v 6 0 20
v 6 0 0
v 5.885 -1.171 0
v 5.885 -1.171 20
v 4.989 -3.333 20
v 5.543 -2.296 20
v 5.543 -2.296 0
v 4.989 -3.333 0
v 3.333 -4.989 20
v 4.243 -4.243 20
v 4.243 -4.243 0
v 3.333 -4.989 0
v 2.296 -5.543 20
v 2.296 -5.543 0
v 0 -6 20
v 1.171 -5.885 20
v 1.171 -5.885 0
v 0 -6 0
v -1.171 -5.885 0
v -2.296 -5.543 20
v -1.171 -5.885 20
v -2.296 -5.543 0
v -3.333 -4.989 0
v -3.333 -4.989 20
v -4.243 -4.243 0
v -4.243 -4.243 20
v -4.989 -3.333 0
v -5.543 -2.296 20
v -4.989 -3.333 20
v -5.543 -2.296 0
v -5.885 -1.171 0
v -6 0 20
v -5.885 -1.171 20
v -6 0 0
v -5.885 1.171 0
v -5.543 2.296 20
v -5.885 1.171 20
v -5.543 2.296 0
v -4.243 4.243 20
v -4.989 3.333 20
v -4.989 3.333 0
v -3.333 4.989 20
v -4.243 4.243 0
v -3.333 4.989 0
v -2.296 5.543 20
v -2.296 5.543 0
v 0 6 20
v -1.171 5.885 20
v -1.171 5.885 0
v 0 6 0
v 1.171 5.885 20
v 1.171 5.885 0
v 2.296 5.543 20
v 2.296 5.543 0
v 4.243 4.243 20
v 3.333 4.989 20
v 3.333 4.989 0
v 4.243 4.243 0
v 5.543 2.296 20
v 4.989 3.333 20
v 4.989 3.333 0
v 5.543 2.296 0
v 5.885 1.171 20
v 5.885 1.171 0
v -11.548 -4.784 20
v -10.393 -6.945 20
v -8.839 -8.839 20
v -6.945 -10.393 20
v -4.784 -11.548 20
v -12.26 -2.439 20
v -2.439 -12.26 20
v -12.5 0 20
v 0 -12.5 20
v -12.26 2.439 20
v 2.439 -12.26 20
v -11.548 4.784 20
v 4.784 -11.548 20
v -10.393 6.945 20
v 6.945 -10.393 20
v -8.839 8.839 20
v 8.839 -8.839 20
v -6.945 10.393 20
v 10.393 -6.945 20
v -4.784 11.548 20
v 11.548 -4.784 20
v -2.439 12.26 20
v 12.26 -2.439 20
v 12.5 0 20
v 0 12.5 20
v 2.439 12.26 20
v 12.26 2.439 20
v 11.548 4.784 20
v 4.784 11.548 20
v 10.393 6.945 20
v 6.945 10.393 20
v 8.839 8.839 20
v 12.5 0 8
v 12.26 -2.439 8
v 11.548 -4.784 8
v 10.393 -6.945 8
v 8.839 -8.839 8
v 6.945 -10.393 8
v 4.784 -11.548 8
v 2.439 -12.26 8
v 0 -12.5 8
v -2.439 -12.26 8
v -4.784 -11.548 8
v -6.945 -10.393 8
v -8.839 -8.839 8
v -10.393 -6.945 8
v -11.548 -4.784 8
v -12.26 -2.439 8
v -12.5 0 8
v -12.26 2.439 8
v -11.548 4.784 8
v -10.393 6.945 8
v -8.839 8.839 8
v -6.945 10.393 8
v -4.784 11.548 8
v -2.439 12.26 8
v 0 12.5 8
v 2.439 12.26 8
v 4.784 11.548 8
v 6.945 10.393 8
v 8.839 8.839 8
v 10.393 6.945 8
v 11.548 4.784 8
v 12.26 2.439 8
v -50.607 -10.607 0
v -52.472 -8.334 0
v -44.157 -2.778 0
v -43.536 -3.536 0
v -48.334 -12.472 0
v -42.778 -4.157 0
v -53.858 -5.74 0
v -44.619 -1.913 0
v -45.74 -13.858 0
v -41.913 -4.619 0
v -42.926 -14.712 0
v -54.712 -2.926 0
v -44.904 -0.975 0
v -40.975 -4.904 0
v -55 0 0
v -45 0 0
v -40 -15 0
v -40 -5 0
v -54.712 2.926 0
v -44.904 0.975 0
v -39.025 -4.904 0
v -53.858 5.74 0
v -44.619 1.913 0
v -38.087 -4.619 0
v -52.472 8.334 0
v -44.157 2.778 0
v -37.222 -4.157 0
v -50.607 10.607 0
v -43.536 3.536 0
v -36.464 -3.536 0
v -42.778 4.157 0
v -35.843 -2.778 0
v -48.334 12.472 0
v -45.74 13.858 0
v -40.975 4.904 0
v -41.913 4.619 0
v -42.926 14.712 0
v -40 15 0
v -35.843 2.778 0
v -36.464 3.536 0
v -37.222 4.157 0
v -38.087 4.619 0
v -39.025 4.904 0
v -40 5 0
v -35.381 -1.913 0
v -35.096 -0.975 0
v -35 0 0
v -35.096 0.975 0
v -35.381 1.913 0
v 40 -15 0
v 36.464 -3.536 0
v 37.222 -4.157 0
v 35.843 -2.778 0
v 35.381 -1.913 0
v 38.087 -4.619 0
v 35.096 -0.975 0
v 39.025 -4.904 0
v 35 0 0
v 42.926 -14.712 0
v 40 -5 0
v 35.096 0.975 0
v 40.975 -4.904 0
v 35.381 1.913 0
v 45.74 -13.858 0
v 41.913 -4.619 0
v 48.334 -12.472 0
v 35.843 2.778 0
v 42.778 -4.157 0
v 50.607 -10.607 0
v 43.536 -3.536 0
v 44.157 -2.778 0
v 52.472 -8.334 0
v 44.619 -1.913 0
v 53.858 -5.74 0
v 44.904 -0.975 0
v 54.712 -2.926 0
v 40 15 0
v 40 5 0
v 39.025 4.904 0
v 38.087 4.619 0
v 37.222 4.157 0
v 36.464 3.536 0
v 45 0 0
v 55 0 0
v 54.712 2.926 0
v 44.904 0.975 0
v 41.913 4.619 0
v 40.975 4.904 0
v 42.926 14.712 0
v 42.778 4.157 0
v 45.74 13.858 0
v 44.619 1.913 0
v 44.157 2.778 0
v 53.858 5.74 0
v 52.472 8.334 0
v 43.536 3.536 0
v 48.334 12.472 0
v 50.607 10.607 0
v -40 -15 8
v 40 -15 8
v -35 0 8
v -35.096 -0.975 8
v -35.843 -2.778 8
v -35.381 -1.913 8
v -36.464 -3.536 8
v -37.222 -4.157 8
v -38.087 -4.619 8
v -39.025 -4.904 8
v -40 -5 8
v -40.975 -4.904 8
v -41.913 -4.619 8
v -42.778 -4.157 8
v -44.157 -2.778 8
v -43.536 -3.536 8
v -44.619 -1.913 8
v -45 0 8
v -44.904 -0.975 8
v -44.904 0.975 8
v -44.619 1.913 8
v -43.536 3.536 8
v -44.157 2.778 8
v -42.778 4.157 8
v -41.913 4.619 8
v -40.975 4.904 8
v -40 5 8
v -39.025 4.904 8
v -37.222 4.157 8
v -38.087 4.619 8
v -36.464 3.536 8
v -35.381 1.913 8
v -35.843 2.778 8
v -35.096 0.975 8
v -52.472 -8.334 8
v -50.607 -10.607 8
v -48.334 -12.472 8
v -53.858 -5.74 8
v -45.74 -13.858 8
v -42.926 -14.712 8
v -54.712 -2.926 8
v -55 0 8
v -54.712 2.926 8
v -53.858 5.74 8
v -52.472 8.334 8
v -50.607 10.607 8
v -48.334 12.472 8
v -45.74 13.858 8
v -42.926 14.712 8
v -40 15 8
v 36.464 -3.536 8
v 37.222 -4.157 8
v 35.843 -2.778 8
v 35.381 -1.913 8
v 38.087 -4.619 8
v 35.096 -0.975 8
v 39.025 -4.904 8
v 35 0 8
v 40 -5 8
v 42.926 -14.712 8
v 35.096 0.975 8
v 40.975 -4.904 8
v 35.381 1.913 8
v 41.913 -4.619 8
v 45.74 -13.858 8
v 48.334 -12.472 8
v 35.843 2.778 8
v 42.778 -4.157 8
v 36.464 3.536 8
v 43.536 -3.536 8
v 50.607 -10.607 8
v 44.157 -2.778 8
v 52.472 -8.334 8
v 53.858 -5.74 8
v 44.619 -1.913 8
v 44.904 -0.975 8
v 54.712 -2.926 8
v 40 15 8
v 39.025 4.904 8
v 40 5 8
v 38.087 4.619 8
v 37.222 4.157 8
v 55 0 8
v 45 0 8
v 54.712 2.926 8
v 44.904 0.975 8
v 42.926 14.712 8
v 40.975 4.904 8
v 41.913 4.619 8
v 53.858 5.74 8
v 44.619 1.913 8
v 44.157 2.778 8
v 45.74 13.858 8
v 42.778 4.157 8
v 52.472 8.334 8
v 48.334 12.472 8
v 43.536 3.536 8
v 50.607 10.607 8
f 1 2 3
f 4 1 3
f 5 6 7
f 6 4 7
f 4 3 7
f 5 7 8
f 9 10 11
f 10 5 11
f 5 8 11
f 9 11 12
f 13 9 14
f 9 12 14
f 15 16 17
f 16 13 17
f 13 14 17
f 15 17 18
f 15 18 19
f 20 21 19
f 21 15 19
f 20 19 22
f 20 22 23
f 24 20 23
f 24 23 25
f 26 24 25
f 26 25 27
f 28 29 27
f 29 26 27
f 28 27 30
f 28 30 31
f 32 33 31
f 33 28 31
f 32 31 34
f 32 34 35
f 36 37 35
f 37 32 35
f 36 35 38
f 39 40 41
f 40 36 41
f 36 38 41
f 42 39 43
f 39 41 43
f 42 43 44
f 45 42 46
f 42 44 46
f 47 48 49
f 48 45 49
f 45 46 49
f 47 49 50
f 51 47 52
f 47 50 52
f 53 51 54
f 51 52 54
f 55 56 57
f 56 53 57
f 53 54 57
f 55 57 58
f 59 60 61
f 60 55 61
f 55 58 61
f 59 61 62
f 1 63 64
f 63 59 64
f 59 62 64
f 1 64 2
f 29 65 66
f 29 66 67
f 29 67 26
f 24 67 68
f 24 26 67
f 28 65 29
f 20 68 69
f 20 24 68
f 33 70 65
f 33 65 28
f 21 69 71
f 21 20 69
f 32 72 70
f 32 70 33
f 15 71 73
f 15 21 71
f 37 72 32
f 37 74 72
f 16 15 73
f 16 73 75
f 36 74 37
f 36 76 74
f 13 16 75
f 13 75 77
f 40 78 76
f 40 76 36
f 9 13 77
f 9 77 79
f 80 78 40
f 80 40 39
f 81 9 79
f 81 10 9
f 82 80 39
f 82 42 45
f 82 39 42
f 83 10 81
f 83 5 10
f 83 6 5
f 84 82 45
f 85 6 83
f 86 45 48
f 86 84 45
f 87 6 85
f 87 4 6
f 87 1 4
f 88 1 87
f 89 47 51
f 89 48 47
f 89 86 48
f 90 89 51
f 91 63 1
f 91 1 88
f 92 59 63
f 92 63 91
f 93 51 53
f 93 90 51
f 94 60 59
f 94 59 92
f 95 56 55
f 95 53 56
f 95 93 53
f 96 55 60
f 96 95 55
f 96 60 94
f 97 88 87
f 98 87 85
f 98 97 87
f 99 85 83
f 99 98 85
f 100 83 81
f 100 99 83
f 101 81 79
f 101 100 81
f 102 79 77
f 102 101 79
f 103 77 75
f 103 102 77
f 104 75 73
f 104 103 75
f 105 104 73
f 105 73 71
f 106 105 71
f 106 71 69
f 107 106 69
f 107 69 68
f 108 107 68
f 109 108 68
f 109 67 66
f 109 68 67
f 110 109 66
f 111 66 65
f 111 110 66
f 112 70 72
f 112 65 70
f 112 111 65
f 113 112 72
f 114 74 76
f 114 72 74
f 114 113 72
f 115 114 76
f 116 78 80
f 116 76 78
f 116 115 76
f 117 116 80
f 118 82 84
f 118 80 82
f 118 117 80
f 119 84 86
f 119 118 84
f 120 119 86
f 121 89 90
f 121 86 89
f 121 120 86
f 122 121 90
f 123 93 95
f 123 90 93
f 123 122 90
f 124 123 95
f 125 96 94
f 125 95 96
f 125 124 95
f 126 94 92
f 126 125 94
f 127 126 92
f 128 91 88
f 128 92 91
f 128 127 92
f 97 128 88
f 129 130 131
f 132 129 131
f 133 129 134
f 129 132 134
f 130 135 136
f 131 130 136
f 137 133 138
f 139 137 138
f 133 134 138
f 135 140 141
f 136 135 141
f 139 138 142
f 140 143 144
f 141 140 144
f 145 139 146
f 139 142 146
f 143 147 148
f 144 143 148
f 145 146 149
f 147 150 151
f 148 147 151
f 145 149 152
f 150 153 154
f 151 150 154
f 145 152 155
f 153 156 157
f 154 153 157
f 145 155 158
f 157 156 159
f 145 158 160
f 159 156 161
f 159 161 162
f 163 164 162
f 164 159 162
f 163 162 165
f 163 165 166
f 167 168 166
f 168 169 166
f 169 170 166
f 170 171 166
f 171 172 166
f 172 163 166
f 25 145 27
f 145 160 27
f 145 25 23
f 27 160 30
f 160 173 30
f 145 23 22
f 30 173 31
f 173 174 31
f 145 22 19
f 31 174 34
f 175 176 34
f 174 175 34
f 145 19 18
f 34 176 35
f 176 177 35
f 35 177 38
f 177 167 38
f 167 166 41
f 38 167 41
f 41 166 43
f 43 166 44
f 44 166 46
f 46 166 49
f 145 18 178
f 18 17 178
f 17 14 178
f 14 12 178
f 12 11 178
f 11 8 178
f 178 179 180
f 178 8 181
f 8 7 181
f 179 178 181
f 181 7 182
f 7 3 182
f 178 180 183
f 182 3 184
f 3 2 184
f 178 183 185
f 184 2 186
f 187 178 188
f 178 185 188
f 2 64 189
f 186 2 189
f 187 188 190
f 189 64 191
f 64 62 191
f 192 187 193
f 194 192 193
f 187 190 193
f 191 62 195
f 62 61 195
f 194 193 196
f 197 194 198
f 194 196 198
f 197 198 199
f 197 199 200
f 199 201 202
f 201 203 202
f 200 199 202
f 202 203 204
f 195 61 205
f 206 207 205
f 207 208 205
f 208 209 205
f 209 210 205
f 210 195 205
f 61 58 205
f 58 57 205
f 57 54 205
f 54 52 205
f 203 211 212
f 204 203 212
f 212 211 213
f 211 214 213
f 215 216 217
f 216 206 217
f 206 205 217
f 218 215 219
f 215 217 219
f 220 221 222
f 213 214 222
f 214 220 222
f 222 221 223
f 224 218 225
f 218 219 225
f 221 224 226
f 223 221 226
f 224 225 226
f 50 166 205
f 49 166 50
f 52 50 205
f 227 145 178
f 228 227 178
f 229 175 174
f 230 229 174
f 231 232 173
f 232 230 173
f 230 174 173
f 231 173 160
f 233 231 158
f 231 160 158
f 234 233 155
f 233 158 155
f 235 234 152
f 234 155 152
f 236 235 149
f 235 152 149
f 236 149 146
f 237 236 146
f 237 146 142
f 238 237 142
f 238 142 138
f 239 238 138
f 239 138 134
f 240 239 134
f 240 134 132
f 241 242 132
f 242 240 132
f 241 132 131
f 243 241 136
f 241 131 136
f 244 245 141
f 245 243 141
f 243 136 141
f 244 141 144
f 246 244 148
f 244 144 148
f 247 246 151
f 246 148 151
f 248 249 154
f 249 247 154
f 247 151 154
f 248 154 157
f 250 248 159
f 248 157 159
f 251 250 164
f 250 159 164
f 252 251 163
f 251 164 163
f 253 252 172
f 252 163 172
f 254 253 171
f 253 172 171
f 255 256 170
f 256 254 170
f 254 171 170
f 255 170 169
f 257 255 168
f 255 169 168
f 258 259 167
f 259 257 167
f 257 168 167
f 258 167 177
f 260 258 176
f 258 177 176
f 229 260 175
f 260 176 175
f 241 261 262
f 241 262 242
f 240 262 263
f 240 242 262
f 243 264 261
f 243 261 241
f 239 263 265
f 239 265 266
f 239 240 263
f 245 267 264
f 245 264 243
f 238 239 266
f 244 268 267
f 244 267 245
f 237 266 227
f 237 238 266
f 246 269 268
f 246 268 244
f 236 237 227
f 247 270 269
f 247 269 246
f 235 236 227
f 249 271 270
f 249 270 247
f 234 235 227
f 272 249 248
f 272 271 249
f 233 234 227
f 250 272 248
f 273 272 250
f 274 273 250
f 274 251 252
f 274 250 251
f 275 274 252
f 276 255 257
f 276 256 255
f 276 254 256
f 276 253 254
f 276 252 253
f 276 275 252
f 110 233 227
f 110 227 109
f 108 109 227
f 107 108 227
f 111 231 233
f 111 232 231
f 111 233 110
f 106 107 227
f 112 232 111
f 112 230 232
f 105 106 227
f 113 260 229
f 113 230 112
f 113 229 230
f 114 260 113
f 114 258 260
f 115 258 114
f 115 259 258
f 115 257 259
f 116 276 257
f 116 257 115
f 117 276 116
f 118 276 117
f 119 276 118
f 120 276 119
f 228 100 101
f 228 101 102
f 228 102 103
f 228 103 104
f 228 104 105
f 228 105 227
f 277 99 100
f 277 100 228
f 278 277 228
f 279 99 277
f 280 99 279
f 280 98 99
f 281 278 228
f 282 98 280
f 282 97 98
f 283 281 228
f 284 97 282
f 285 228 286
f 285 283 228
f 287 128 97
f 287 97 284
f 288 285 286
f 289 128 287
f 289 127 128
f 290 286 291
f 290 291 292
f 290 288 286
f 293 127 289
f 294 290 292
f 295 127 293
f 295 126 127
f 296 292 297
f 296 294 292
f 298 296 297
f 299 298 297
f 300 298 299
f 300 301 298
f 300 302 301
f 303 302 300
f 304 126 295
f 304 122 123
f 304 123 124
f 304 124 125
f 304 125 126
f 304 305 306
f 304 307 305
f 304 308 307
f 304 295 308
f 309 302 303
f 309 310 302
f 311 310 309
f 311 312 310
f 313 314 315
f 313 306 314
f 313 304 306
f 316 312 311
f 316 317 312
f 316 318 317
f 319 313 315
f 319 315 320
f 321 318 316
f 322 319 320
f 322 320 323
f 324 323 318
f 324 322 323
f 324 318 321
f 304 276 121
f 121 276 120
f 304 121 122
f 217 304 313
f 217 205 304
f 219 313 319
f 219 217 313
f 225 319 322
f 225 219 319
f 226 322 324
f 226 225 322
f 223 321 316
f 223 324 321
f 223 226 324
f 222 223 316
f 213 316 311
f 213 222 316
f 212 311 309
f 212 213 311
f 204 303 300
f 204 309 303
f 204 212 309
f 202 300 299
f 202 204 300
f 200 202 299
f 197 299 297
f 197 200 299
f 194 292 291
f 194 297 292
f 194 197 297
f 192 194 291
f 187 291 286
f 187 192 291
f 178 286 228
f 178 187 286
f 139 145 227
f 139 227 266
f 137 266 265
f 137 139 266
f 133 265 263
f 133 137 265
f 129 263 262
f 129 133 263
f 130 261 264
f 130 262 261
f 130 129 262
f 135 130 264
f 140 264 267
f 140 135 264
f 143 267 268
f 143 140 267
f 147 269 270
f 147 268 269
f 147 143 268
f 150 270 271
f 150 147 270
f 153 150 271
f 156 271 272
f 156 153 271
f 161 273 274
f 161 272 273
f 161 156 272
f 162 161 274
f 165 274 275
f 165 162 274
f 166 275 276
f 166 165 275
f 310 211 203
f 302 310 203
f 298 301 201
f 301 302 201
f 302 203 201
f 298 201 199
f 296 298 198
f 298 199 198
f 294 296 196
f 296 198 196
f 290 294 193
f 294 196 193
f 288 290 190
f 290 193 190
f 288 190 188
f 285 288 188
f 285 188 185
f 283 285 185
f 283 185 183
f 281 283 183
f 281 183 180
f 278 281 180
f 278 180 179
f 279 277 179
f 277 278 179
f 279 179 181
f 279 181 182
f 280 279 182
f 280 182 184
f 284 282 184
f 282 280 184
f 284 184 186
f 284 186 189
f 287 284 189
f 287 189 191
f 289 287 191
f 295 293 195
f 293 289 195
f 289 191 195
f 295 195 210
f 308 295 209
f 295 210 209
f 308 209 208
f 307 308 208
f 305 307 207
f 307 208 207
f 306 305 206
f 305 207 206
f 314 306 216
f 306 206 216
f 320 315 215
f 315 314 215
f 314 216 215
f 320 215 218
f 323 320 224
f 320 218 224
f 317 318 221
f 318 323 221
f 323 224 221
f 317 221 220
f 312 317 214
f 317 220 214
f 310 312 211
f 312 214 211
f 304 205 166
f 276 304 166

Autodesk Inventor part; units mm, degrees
ref_plane "YZ Plane" through (0, 0, 0) normal (1, 0, 0) x (0, 1, 0)
ref_plane "XZ Plane" through (0, 0, 0) normal (0, 1, 0) x (-1, 0, 0)
ref_plane "XY Plane" through (0, 0, 0) normal (0, 0, 1) x (1, 0, 0)
sketch "Эскиз1" plane through (0, 0, 0) normal (0, 0, 1) x (1, 0, 0)
  line L0 (-40, 0) -> (40, 0) construction
  line L1 (-40, -15) -> (40, -15)
  line L2 (40, 15) -> (-40, 15)
  arc A0 (-40, 15) -> (-40, -15) centre (-40, 0) ccw
  arc A1 (40, -15) -> (40, 15) centre (40, 0) ccw
  circle A2 centre (0, 0) radius 12.5
  circle A3 centre (0, 0) radius 6
  circle A4 centre (40, 0) radius 5
  circle A5 centre (-40, 0) radius 5
  dimension "d2" = 80
  dimension "d3" = 30
  dimension "d4" = 25
  dimension "d5" = 12
  dimension "d6" = 10
  dimension "d7" = 10
extrude "Выдавливание1" add sketch "Эскиз1" along normal blind 8 contours A0 L2 A1 L1 | A2 | A4 | A5
extrude "Выдавливание2" cut sketch "Эскиз1" along normal blind 8 contours A4 | A5
extrude "Выдавливание3" add sketch "Эскиз1" along normal blind 20 contours A2
properties part number "lab3_1" material "Свинец"
